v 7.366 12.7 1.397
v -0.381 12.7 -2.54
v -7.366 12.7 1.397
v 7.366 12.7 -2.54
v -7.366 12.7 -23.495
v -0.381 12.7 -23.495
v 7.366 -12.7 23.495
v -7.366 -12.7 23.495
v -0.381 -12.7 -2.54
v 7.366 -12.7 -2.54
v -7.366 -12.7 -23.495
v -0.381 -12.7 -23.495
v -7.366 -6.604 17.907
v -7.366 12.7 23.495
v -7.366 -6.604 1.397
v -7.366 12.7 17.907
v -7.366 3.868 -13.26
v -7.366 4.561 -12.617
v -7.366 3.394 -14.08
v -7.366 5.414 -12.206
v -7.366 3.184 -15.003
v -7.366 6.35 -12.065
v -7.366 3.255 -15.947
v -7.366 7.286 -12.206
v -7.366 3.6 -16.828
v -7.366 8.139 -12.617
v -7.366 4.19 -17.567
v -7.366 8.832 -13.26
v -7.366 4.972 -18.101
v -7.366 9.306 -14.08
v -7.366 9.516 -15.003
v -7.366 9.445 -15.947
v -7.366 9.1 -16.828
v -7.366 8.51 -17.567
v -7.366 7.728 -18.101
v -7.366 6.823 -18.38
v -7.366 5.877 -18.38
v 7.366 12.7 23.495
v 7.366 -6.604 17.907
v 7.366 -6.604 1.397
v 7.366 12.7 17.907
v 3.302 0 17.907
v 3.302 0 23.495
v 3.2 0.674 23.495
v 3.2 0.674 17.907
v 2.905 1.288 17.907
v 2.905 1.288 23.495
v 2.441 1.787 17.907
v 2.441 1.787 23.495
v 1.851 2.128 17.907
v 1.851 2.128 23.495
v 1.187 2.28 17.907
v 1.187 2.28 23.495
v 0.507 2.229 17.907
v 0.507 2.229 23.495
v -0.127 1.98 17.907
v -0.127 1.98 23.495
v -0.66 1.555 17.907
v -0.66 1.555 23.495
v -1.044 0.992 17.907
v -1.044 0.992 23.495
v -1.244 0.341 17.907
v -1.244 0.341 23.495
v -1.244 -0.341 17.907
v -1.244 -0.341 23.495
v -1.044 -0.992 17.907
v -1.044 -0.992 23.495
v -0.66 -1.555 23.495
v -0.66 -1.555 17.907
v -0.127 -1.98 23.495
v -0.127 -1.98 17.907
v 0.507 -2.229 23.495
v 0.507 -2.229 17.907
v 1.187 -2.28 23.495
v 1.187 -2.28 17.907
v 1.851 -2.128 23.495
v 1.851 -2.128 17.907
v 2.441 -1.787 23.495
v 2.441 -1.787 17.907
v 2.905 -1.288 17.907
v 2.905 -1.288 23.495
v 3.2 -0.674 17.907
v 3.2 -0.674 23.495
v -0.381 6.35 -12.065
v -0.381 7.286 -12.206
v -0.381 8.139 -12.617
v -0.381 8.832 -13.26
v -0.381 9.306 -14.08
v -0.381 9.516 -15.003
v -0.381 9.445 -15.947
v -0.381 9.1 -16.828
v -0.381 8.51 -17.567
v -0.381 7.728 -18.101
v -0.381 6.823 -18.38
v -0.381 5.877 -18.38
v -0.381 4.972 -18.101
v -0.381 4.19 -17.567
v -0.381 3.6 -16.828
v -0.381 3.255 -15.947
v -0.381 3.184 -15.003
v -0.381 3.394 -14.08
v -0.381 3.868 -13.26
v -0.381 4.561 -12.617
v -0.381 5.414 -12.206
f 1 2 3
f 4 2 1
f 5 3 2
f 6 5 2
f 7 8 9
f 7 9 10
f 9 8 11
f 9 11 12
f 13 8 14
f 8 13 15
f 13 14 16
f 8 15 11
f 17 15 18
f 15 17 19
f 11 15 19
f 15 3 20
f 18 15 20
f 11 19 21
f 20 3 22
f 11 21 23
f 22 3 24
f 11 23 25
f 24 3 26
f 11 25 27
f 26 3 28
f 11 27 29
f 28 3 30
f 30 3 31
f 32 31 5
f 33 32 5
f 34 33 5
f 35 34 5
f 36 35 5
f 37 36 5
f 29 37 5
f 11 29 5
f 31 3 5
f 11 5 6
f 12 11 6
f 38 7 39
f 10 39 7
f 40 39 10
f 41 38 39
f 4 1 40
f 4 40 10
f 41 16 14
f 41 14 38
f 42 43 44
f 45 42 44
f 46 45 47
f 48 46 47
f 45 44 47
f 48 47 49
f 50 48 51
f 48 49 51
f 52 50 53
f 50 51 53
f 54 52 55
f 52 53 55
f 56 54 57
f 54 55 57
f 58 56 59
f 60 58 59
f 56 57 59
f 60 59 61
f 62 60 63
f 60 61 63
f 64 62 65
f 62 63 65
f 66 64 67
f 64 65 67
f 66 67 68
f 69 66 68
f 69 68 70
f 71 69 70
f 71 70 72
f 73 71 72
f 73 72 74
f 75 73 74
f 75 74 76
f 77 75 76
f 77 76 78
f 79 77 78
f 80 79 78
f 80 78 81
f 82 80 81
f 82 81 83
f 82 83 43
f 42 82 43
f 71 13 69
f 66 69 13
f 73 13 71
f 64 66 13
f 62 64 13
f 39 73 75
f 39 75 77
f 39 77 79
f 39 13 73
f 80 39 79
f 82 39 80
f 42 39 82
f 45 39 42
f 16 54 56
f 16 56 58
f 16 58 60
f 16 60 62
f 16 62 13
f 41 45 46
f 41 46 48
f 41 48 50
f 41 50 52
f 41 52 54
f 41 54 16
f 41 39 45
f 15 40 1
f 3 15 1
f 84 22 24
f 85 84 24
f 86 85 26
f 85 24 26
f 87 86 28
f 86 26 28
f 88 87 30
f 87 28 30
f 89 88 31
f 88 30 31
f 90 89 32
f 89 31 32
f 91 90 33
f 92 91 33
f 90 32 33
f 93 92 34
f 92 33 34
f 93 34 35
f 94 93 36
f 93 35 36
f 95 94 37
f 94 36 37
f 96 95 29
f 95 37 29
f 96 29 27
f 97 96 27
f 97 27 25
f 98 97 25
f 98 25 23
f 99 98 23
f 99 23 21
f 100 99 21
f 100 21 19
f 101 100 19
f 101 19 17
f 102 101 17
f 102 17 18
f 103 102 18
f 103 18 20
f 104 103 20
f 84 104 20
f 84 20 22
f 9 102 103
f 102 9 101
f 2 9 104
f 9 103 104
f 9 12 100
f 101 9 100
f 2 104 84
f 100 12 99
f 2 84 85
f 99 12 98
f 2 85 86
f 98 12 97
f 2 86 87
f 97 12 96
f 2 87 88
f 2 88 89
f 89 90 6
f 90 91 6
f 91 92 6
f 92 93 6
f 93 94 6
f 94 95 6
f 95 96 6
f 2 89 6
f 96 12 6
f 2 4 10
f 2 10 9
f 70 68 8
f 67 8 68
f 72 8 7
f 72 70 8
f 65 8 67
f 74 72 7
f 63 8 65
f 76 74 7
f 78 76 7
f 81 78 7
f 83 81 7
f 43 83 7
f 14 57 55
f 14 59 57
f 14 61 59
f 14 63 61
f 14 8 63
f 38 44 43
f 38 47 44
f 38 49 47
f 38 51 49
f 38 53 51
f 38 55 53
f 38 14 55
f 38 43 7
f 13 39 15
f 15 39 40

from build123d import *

# Parameters (mm, degrees)
SKETCH1_W           = 14.732
SKETCH1_H           = 46.99
BOSS_EXTRUDE1_DEPTH = 12.7
SKETCH2_W           = 16.51
SKETCH2_H           = 19.304
CUT_EXTRUDE1_DEPTH  = 15.732
CUT_EXTRUDE2_REACH  = 48.99
SKETCH3_R           = 2.286
SKETCH4_W           = 7.747
SKETCH4_H           = 25.4
CUT_EXTRUDE3_DEPTH  = 20.955
SKETCH5_R           = 3.175
CUT_EXTRUDE4_DEPTH  = 15.732


with BuildPart() as part:
    # Sketch1 → Boss-Extrude1 (new body, symmetric)
    with BuildSketch(Plane(origin=(0, 0, 0), x_dir=(1, 0, 0), z_dir=(0, 1, 0))):
        Rectangle(SKETCH1_W, SKETCH1_H)
    extrude(amount=BOSS_EXTRUDE1_DEPTH, both=True)

    # Sketch2 → Cut-Extrude1 (cut, through all)
    with BuildSketch(Plane(origin=(7.366, 0, 0), x_dir=(0, 0, -1), z_dir=(1, 0, 0))):
        with Locations((-9.652, 3.048)):
            Rectangle(SKETCH2_W, SKETCH2_H)
    extrude(amount=-CUT_EXTRUDE1_DEPTH, mode=Mode.SUBTRACT)

    # Sketch3 → Cut-Extrude2 (cut, up to next)
    with BuildSketch(Plane.XY.offset(23.495), mode=Mode.PRIVATE) as cut_extrude2_sk1:
        with Locations((1.016, 0)):
            Circle(SKETCH3_R)
    cut_extrude2_tool1 = extrude(cut_extrude2_sk1.sketch, amount=-CUT_EXTRUDE2_REACH, mode=Mode.PRIVATE) & part.part
    add(cut_extrude2_tool1.solids().sort_by_distance((1.016, 0, 23.495))[0], mode=Mode.SUBTRACT)

    # Sketch4 → Cut-Extrude3 (cut)
    with BuildSketch(Plane(origin=(0, 0, -23.495), x_dir=(-1, 0, 0), z_dir=(0, 0, -1))):
        with Locations((-3.4925, 0)):
            Rectangle(SKETCH4_W, SKETCH4_H)
    extrude(amount=-CUT_EXTRUDE3_DEPTH, mode=Mode.SUBTRACT)

    # Sketch5 → Cut-Extrude4 (cut, through all)
    with BuildSketch(Plane.ZY.offset(7.366)):
        with Locations((-15.24, 6.35)):
            Circle(SKETCH5_R)
    extrude(amount=-CUT_EXTRUDE4_DEPTH, mode=Mode.SUBTRACT)


solid = part.part
